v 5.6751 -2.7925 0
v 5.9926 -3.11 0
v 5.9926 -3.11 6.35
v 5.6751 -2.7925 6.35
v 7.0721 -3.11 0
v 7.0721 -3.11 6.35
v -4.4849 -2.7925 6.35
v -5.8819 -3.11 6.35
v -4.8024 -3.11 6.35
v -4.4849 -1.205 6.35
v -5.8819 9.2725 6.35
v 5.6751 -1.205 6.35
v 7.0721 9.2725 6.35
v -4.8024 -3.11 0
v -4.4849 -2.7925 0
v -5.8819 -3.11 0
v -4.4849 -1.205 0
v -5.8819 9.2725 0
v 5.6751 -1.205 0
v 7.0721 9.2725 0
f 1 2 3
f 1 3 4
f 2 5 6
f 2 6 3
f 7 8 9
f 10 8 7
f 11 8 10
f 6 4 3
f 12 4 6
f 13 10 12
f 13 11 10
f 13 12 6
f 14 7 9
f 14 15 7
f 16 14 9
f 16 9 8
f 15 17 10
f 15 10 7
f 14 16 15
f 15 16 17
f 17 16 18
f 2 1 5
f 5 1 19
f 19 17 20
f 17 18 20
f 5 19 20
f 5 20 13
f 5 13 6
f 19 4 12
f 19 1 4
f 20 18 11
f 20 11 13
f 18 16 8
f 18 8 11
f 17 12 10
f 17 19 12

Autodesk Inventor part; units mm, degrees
ref_plane "YZ Plane" through (0, 0, 0) normal (1, 0, 0) x (0, 1, 0)
ref_plane "XZ Plane" through (0, 0, 0) normal (0, 1, 0) x (-1, 0, 0)
ref_plane "XY Plane" through (0, 0, 0) normal (0, 0, 1) x (1, 0, 0)
sketch "DM3D-SF, DX3D-SF_53" plane through (0, 0, 0) normal (0, 0, 1) x (1, 0, 0)
  line L0 (-5.8819, 9.2725) -> (7.0721, 9.2725)
  line L1 (7.0721, 9.2725) -> (7.0721, -3.11)
  line L2 (7.0721, -3.11) -> (5.9926, -3.11)
  line L3 (5.9926, -3.11) -> (5.6751, -2.7925)
  line L4 (5.6751, -2.7925) -> (5.6751, -1.205)
  line L5 (5.6751, -1.205) -> (-4.4849, -1.205)
  line L6 (-4.4849, -1.205) -> (-4.4849, -2.7925)
  line L7 (-4.4849, -2.7925) -> (-4.8024, -3.11)
  line L8 (-4.8024, -3.11) -> (-5.8819, -3.11)
  line L9 (-5.8819, -3.11) -> (-5.8819, 9.2725)
extrude "Extrusion1" add sketch "DM3D-SF, DX3D-SF_53" along normal blind 6.35
properties part number "DX3D-SF"
